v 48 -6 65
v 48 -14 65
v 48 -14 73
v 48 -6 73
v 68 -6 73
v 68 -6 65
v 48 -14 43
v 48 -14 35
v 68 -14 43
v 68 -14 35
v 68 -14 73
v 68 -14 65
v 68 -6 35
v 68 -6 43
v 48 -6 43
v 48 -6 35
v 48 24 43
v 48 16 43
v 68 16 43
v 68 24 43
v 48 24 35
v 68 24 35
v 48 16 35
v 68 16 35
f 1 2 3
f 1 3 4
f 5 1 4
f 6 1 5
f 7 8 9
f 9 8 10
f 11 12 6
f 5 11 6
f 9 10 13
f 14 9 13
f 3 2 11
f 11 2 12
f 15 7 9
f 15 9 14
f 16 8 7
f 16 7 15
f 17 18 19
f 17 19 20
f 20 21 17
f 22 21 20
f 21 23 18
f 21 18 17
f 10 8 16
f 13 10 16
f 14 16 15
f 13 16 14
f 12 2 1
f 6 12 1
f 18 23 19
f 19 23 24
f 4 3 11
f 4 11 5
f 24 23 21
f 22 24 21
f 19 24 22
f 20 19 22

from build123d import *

# Parameters (mm, degrees)
BOX813_W     = 8
BOX813_H     = 20
BOX813_DEPTH = 8
BOX809_W     = 8
BOX809_H     = 20
BOX809_DEPTH = 8
BOX812_W     = 8
BOX812_H     = 20
BOX812_DEPTH = 8


with BuildPart() as krychle813:
    # Box813 → Box813 (new body)
    with BuildSketch(Plane(origin=(-48, 16, 35), x_dir=(0, 1, 0), z_dir=(0, 0, 1))):
        with Locations((4, 10)):
            Rectangle(BOX813_W, BOX813_H)
    extrude(amount=BOX813_DEPTH)


with BuildPart() as krychle809:
    # Box809 → Box809 (new body)
    with BuildSketch(Plane(origin=(-48, -14, 65), x_dir=(0, 1, 0), z_dir=(0, 0, 1))):
        with Locations((4, 10)):
            Rectangle(BOX809_W, BOX809_H)
    extrude(amount=BOX809_DEPTH)


with BuildPart() as compound943:
    # Box812 → Box812 (new body)
    with BuildSketch(Plane(origin=(-48, -14, 35), x_dir=(0, 1, 0), z_dir=(0, 0, 1))):
        with Locations((4, 10)):
            Rectangle(BOX812_W, BOX812_H)
    extrude(amount=BOX812_DEPTH)

    # Compound943: union Krychle813, Krychle809
    add(krychle813.part)
    add(krychle809.part)


with BuildPart() as compound943_mirrored:
    # mirror007: instance of Compound943
    add(compound943.part.mirror(Plane(origin=(4e-06, 5, 54), x_dir=(0, -1, 0), z_dir=(1, 0, 0))))


solid = compound943_mirrored.part
